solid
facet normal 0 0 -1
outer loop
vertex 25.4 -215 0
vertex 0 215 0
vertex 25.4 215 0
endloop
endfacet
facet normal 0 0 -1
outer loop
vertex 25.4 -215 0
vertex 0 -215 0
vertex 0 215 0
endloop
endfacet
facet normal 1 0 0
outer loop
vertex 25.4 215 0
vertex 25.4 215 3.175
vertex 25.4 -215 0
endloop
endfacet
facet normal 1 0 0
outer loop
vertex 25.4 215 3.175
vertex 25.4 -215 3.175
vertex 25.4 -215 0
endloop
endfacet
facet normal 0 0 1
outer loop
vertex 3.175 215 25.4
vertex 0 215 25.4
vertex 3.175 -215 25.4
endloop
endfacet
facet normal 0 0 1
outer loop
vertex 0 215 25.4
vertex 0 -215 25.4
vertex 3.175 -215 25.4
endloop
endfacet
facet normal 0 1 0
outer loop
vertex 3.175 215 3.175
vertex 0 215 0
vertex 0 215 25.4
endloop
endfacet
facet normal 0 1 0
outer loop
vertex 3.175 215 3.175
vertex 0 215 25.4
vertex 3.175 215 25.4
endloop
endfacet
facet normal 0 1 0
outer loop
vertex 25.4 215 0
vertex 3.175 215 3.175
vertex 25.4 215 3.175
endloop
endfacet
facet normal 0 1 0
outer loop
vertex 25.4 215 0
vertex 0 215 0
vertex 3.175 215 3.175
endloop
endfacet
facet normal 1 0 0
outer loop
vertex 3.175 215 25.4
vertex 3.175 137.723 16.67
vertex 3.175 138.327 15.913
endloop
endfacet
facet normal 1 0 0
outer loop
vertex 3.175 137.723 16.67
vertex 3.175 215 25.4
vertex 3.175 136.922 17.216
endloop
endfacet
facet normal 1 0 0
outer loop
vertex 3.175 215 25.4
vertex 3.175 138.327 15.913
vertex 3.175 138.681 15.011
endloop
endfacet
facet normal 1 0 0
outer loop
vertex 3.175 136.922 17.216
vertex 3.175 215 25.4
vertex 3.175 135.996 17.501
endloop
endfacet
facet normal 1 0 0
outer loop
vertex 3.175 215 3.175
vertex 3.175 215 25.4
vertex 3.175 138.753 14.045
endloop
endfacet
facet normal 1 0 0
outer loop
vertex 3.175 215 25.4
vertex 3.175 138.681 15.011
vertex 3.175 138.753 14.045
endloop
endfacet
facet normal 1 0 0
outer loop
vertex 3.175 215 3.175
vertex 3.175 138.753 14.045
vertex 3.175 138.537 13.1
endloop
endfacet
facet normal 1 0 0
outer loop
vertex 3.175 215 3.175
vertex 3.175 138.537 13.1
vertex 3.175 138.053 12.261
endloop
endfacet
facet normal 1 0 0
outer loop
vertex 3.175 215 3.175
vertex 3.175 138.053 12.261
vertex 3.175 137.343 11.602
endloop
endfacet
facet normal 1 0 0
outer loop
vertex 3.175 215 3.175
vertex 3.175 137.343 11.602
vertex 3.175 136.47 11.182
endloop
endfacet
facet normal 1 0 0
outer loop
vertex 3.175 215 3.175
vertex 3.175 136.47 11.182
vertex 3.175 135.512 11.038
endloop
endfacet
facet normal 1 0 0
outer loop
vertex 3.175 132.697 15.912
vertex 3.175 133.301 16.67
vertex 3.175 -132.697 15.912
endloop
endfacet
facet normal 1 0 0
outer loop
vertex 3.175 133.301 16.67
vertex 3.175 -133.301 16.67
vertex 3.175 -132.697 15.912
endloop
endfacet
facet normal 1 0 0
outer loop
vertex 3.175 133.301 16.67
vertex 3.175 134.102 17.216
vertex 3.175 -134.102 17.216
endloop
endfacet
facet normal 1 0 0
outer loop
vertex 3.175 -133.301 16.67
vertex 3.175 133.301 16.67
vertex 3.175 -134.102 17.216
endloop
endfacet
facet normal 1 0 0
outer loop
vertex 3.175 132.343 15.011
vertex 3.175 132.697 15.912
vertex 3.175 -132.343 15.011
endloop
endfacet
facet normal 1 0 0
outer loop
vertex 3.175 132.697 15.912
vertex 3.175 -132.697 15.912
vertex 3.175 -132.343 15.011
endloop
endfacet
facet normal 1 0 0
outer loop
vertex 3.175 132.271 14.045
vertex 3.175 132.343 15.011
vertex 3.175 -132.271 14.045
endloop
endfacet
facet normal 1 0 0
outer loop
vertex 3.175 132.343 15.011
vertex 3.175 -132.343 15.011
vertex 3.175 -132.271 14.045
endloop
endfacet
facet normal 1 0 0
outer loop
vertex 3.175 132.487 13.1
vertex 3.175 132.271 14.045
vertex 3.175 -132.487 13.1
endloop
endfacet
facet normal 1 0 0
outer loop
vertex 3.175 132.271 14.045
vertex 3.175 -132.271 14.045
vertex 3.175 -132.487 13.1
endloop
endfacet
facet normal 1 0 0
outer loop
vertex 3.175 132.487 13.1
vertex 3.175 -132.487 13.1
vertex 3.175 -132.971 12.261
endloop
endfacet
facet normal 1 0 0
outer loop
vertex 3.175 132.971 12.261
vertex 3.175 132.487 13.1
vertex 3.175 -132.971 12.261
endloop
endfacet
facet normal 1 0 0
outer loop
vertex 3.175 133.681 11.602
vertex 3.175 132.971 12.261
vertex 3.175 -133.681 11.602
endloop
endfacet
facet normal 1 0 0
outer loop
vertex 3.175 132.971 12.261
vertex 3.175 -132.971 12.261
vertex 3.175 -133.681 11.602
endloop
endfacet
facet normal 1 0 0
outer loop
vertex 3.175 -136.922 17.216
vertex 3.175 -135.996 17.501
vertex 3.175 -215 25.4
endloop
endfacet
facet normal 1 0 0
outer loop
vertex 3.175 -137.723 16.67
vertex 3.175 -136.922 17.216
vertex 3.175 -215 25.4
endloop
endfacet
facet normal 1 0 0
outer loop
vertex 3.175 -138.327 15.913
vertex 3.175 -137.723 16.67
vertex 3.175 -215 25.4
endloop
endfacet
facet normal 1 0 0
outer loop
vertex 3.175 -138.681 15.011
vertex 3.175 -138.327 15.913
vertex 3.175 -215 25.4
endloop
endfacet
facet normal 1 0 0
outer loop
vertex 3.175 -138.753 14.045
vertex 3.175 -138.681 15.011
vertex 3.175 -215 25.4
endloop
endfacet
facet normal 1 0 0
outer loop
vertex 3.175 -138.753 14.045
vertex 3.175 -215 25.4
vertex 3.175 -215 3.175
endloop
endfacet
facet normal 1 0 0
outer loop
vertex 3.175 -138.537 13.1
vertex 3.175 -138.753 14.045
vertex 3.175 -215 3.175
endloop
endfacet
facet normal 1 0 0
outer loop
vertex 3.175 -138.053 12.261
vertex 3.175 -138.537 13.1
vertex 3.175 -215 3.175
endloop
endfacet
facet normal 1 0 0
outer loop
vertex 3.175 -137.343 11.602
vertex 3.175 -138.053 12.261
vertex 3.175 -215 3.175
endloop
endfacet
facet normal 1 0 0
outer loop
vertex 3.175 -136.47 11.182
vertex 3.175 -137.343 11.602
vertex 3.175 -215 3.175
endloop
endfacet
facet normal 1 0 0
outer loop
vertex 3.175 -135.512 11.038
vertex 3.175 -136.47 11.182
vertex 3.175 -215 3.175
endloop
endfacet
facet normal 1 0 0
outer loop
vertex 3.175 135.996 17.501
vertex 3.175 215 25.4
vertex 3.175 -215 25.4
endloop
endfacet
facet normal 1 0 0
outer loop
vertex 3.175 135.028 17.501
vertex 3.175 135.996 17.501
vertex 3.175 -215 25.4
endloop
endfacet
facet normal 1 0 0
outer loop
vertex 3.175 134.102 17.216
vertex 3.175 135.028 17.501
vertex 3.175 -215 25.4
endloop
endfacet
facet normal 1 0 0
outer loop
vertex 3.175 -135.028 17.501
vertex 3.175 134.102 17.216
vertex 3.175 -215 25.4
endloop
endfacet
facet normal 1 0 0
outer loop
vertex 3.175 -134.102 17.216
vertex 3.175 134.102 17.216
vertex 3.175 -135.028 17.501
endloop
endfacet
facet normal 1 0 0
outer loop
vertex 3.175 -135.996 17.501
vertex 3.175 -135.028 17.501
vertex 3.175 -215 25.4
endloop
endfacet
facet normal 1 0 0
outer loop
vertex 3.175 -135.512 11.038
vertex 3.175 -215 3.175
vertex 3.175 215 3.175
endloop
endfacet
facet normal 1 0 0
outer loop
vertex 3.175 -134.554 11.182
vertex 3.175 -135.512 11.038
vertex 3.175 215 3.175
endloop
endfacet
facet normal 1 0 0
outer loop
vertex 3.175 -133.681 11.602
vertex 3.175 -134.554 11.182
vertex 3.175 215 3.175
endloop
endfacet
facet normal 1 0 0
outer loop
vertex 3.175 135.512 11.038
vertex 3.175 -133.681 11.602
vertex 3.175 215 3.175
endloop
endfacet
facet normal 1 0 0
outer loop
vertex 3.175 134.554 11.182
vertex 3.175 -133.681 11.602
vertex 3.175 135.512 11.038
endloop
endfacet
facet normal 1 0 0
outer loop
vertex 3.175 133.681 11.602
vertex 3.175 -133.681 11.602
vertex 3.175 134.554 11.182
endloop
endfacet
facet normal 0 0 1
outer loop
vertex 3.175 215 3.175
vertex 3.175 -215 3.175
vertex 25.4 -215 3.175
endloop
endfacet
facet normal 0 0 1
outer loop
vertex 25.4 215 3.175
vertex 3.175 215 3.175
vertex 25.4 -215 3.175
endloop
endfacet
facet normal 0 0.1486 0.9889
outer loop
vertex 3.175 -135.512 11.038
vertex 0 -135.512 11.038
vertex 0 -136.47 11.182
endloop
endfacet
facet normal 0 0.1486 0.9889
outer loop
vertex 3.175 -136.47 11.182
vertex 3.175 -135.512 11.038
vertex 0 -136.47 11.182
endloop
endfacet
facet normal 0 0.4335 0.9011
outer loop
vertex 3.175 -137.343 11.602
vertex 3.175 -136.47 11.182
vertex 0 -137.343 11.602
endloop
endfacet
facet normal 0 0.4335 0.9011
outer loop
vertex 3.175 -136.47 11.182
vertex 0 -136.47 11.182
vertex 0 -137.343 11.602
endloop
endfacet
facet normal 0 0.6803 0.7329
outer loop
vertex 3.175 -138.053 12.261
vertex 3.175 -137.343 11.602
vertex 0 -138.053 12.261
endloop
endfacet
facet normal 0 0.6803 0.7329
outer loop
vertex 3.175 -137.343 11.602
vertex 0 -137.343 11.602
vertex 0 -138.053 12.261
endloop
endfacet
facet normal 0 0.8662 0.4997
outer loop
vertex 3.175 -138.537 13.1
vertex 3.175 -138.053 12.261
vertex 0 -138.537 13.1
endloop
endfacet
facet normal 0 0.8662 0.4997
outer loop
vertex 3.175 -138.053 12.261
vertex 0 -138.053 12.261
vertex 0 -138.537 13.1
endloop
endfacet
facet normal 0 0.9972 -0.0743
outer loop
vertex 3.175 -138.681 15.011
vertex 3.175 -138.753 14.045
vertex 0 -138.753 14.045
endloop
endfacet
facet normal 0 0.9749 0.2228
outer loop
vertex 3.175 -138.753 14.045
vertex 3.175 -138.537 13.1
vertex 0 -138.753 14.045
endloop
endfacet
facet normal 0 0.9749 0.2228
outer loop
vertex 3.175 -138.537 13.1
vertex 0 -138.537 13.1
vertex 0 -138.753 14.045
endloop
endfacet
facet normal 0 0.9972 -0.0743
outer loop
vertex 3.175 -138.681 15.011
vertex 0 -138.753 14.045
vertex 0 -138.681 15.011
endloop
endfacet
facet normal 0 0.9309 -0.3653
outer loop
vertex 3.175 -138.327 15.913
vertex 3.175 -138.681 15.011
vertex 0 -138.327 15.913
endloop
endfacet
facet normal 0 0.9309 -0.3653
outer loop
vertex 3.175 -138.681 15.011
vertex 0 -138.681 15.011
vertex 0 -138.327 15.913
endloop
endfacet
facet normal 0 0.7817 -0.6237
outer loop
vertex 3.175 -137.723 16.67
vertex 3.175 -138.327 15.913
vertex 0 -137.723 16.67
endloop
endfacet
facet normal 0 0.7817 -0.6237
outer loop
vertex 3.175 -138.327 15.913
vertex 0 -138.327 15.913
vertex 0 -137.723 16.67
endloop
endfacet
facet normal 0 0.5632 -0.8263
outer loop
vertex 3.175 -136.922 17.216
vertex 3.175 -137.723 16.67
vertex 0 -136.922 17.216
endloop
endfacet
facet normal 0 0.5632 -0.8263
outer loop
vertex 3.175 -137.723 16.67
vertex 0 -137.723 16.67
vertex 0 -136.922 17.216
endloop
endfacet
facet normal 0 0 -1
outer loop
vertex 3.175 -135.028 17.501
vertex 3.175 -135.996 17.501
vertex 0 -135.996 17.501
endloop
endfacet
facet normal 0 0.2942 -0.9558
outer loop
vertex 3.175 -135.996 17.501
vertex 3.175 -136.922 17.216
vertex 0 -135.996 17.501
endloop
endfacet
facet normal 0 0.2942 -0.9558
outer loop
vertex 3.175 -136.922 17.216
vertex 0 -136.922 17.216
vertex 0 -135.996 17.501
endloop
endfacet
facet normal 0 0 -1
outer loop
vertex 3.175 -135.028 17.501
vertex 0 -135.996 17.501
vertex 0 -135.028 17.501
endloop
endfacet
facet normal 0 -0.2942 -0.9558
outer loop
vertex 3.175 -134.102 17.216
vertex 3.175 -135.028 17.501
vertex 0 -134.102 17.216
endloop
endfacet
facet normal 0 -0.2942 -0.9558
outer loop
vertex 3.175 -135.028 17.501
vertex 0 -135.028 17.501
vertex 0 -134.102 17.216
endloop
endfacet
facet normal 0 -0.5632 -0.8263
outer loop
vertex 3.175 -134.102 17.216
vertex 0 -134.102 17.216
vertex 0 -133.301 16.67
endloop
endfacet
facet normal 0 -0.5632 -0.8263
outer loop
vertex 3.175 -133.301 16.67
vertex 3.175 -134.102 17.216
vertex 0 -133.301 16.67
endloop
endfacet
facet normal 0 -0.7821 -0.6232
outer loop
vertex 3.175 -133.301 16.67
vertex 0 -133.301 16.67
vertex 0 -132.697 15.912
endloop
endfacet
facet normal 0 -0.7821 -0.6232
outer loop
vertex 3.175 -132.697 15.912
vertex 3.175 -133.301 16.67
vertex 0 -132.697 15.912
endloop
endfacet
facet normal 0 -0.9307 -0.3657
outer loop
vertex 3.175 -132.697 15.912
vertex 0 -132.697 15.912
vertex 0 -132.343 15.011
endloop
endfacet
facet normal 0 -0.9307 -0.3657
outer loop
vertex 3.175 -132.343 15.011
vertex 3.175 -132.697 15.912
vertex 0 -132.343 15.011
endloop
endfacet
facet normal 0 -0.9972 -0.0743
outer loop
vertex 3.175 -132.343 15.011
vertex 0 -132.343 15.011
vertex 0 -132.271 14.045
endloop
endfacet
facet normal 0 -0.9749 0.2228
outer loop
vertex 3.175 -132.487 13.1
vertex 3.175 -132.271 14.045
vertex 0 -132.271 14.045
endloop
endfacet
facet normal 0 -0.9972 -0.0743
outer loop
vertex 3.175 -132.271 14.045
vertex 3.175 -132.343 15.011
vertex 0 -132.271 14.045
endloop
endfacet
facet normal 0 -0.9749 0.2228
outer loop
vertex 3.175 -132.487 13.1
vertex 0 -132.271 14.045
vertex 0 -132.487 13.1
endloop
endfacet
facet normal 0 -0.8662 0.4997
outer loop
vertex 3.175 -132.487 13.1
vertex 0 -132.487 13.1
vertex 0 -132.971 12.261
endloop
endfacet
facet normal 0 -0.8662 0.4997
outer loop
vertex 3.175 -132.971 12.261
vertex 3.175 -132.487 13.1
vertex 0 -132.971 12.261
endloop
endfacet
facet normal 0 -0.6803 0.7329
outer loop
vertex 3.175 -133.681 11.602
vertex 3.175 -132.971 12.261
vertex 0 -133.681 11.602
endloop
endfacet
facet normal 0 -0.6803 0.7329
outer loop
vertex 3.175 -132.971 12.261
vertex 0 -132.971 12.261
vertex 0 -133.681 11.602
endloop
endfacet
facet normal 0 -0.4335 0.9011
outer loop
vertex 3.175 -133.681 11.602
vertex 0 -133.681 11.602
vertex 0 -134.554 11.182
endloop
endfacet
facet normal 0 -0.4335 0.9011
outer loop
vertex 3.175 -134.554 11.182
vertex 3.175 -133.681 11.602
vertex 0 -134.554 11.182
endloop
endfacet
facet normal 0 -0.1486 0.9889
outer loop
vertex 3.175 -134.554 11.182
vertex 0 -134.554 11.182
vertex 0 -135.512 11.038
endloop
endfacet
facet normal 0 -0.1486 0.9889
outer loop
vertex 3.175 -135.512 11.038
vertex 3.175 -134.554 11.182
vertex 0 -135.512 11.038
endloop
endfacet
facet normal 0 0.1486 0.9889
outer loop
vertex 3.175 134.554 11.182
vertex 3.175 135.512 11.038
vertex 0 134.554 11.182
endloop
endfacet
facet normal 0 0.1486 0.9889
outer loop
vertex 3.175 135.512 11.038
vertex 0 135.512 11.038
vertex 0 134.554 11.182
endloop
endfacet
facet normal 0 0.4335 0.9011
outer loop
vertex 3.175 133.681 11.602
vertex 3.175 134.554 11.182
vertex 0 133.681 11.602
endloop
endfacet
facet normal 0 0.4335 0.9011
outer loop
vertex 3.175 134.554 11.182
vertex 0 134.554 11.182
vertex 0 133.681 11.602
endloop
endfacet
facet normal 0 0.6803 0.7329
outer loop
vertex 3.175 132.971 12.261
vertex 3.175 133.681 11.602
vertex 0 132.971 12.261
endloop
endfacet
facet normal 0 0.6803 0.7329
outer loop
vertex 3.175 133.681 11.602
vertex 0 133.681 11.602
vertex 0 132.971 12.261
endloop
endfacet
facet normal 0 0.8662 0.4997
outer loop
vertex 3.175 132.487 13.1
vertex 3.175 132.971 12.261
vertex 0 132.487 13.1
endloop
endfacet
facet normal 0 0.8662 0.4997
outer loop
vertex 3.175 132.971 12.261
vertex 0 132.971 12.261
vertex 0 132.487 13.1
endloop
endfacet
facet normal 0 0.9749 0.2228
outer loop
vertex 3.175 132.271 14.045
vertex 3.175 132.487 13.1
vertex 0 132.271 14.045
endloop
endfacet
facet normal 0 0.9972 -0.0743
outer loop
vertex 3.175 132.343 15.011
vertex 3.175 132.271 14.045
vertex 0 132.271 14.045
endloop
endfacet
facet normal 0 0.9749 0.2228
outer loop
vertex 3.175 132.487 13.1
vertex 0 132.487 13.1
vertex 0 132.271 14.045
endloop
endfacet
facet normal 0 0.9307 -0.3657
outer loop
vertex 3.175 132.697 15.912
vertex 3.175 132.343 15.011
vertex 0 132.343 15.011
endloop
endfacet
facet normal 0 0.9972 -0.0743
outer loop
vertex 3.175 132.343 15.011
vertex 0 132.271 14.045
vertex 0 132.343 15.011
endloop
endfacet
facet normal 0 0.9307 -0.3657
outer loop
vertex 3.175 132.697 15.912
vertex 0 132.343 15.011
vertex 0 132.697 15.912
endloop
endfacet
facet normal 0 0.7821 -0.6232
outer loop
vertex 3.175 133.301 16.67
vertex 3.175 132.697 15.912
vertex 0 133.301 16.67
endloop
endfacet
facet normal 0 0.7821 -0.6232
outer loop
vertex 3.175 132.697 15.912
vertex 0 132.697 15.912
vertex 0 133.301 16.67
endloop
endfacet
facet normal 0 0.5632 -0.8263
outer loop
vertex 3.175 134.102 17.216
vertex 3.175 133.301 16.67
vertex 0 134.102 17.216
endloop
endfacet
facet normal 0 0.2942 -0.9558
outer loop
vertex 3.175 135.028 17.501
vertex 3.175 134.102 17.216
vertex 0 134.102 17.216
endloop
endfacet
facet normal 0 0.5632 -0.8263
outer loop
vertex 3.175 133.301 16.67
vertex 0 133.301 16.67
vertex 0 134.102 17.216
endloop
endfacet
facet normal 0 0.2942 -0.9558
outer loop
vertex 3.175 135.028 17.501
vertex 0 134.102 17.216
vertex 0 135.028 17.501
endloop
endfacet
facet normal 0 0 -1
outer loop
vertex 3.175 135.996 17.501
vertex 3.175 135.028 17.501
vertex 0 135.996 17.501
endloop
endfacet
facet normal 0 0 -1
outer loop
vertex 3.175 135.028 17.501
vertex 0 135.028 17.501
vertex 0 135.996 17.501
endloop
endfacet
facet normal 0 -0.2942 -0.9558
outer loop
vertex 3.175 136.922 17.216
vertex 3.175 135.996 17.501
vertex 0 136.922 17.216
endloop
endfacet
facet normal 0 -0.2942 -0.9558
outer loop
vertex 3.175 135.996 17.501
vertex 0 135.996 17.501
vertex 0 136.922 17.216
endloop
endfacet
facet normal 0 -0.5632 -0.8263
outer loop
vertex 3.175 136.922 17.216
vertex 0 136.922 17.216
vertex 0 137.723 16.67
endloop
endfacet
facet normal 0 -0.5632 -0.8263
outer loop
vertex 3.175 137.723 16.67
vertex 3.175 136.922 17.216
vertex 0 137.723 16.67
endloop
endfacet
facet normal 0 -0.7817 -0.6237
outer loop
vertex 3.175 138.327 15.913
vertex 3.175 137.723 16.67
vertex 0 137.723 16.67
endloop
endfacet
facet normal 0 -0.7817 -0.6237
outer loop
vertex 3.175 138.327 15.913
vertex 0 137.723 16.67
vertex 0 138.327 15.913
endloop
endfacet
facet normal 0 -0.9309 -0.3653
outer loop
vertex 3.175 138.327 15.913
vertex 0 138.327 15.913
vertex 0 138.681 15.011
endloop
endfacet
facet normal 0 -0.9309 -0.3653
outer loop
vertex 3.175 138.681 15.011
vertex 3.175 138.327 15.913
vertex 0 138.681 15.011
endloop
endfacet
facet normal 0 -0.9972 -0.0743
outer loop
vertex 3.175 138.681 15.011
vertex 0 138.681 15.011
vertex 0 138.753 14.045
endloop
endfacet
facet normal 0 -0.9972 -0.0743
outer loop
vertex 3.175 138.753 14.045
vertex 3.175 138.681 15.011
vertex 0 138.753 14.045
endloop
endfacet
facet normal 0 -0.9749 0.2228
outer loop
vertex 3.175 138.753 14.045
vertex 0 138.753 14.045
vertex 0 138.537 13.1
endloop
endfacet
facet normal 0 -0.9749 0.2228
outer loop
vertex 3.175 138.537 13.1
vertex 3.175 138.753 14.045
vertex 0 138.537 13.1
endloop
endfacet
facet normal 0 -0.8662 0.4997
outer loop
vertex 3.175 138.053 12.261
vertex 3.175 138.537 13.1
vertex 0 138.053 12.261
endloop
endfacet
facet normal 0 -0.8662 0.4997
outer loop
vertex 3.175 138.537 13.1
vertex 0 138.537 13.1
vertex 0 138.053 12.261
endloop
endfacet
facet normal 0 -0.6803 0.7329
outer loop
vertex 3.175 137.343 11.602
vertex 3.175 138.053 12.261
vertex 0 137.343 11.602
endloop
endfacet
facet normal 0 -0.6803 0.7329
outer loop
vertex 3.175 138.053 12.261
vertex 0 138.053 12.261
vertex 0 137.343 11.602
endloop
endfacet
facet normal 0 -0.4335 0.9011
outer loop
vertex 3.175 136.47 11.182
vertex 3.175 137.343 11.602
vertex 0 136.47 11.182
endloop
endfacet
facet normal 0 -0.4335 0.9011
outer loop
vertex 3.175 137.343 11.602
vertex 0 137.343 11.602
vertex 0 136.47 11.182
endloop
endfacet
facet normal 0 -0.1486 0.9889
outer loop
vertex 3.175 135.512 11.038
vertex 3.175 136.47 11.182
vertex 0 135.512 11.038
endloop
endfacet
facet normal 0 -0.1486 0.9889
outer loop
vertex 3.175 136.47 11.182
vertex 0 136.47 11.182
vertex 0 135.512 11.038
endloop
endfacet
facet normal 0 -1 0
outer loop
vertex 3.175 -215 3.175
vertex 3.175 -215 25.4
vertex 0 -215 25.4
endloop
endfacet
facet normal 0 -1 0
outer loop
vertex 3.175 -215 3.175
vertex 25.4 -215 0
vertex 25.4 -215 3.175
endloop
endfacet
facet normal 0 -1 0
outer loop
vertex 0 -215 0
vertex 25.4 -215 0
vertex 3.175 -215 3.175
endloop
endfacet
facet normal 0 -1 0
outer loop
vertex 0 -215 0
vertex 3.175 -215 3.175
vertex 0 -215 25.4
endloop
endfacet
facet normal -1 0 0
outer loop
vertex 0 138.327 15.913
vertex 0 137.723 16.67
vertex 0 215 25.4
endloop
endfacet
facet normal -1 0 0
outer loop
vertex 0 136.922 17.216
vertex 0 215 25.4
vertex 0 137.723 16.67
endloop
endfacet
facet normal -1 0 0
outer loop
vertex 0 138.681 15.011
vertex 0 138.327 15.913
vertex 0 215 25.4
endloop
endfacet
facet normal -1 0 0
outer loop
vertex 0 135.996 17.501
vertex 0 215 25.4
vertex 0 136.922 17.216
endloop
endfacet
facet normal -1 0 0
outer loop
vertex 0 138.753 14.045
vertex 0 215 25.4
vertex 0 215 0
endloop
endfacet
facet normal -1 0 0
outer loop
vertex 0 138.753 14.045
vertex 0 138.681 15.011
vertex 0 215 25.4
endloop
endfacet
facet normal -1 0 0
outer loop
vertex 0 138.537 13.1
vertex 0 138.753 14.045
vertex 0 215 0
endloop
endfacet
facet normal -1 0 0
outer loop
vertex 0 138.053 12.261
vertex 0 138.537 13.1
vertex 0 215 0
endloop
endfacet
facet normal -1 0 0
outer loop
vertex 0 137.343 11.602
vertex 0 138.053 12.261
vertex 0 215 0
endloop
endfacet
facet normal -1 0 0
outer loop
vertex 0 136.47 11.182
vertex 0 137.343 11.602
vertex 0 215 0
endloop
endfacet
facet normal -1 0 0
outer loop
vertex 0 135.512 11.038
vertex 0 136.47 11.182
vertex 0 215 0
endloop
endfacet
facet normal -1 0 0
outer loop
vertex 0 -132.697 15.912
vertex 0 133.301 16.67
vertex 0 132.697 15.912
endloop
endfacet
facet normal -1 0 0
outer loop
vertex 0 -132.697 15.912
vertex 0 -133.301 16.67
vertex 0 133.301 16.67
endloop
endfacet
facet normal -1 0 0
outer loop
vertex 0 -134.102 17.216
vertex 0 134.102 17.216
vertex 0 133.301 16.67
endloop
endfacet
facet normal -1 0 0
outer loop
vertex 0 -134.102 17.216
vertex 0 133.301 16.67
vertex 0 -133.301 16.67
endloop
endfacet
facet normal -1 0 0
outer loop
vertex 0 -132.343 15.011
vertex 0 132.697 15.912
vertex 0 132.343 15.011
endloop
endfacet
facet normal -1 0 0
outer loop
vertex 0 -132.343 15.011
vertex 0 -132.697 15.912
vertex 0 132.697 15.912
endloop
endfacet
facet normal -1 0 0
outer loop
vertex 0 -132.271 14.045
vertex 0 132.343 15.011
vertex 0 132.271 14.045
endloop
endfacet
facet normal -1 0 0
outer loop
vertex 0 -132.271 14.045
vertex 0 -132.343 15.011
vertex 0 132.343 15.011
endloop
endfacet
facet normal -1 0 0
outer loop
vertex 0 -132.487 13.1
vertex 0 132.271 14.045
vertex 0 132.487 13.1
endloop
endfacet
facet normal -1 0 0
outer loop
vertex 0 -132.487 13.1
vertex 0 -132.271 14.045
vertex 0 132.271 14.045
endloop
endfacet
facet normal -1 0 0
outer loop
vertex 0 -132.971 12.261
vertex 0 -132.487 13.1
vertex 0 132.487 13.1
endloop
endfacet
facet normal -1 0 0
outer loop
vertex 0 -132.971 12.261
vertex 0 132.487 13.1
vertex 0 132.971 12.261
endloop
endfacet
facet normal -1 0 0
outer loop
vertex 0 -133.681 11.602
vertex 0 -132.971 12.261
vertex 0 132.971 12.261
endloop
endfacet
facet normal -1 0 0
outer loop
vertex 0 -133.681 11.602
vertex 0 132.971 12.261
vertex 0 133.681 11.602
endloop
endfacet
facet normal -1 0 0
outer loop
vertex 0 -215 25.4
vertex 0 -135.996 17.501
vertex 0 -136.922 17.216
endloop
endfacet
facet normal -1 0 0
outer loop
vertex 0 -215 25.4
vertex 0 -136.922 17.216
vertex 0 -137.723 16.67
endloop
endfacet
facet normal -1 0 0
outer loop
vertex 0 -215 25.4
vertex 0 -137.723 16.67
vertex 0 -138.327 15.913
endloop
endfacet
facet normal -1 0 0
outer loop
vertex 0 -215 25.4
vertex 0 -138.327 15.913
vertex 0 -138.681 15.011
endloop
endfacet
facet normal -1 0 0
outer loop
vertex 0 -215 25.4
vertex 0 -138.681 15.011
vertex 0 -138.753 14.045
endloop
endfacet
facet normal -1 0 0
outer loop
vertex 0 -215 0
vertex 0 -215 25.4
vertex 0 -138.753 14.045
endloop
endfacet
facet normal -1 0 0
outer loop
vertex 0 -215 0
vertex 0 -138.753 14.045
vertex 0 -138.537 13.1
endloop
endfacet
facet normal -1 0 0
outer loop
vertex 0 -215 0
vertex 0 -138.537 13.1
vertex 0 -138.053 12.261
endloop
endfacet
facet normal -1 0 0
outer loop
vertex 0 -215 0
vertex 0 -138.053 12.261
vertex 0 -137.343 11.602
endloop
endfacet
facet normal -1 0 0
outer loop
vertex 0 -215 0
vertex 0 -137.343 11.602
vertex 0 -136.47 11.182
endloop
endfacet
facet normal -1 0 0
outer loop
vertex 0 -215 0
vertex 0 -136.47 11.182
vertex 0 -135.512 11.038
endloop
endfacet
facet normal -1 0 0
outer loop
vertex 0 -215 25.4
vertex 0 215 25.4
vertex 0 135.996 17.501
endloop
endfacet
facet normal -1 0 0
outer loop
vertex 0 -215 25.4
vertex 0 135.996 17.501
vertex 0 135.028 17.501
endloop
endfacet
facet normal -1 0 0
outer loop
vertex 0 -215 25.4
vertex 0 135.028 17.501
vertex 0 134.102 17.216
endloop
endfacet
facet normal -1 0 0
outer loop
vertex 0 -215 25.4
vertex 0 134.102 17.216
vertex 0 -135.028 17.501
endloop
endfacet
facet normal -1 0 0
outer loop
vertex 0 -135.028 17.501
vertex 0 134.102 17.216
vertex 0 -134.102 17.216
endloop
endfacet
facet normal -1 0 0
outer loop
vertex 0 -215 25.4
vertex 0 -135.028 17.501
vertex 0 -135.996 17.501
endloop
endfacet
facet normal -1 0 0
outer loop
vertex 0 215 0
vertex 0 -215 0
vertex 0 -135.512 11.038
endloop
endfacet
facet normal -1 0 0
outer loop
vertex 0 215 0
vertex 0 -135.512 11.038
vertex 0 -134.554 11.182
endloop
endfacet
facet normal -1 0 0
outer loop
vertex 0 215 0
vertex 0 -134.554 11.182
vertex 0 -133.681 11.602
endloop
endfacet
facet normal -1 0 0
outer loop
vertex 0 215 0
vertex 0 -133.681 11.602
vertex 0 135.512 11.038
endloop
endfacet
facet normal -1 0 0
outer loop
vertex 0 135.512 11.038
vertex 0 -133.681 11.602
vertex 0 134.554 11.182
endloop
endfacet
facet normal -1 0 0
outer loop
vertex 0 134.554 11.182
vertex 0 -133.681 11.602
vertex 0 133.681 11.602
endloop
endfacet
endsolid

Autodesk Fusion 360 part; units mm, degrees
sketch "Sketch1" plane through (0, 0, 0) normal (0, 1, 0) x (1, 0, 0)
  line L0 (0, -25.4) -> (0, 0)
  line L1 (0, 0) -> (25.4, 0)
  line L2 (12.7, -12.7) -> (11.05, -11.05) construction
  line L3 (3.175, -25.4) -> (3.175, -3.175)
  line L4 (3.175, -3.175) -> (25.4, -3.175)
  line L5 (25.4, -3.175) -> (25.4, 0)
  line L6 (0, -25.4) -> (3.175, -25.4)
  dimension "d1" = 25.4
  dimension "d2" = 25.4
  dimension "d13" = 3.175
extrude "Extrude1" add sketch "Sketch1" along normal blind 215
hole "Hole3" at (3.175, 135.512, 14.2875) direction (-1, 0, 0) diameter 6.5 end through all
mirror "Mirror1" about plane through (0, 0, 0) normal (0, 1, 0) of bodies 1 merged
equation "d5 = ( 430 / 2 ) * 1 mm"
equation "d27 = ( 22.225 / 2 ) * 1 mm"
